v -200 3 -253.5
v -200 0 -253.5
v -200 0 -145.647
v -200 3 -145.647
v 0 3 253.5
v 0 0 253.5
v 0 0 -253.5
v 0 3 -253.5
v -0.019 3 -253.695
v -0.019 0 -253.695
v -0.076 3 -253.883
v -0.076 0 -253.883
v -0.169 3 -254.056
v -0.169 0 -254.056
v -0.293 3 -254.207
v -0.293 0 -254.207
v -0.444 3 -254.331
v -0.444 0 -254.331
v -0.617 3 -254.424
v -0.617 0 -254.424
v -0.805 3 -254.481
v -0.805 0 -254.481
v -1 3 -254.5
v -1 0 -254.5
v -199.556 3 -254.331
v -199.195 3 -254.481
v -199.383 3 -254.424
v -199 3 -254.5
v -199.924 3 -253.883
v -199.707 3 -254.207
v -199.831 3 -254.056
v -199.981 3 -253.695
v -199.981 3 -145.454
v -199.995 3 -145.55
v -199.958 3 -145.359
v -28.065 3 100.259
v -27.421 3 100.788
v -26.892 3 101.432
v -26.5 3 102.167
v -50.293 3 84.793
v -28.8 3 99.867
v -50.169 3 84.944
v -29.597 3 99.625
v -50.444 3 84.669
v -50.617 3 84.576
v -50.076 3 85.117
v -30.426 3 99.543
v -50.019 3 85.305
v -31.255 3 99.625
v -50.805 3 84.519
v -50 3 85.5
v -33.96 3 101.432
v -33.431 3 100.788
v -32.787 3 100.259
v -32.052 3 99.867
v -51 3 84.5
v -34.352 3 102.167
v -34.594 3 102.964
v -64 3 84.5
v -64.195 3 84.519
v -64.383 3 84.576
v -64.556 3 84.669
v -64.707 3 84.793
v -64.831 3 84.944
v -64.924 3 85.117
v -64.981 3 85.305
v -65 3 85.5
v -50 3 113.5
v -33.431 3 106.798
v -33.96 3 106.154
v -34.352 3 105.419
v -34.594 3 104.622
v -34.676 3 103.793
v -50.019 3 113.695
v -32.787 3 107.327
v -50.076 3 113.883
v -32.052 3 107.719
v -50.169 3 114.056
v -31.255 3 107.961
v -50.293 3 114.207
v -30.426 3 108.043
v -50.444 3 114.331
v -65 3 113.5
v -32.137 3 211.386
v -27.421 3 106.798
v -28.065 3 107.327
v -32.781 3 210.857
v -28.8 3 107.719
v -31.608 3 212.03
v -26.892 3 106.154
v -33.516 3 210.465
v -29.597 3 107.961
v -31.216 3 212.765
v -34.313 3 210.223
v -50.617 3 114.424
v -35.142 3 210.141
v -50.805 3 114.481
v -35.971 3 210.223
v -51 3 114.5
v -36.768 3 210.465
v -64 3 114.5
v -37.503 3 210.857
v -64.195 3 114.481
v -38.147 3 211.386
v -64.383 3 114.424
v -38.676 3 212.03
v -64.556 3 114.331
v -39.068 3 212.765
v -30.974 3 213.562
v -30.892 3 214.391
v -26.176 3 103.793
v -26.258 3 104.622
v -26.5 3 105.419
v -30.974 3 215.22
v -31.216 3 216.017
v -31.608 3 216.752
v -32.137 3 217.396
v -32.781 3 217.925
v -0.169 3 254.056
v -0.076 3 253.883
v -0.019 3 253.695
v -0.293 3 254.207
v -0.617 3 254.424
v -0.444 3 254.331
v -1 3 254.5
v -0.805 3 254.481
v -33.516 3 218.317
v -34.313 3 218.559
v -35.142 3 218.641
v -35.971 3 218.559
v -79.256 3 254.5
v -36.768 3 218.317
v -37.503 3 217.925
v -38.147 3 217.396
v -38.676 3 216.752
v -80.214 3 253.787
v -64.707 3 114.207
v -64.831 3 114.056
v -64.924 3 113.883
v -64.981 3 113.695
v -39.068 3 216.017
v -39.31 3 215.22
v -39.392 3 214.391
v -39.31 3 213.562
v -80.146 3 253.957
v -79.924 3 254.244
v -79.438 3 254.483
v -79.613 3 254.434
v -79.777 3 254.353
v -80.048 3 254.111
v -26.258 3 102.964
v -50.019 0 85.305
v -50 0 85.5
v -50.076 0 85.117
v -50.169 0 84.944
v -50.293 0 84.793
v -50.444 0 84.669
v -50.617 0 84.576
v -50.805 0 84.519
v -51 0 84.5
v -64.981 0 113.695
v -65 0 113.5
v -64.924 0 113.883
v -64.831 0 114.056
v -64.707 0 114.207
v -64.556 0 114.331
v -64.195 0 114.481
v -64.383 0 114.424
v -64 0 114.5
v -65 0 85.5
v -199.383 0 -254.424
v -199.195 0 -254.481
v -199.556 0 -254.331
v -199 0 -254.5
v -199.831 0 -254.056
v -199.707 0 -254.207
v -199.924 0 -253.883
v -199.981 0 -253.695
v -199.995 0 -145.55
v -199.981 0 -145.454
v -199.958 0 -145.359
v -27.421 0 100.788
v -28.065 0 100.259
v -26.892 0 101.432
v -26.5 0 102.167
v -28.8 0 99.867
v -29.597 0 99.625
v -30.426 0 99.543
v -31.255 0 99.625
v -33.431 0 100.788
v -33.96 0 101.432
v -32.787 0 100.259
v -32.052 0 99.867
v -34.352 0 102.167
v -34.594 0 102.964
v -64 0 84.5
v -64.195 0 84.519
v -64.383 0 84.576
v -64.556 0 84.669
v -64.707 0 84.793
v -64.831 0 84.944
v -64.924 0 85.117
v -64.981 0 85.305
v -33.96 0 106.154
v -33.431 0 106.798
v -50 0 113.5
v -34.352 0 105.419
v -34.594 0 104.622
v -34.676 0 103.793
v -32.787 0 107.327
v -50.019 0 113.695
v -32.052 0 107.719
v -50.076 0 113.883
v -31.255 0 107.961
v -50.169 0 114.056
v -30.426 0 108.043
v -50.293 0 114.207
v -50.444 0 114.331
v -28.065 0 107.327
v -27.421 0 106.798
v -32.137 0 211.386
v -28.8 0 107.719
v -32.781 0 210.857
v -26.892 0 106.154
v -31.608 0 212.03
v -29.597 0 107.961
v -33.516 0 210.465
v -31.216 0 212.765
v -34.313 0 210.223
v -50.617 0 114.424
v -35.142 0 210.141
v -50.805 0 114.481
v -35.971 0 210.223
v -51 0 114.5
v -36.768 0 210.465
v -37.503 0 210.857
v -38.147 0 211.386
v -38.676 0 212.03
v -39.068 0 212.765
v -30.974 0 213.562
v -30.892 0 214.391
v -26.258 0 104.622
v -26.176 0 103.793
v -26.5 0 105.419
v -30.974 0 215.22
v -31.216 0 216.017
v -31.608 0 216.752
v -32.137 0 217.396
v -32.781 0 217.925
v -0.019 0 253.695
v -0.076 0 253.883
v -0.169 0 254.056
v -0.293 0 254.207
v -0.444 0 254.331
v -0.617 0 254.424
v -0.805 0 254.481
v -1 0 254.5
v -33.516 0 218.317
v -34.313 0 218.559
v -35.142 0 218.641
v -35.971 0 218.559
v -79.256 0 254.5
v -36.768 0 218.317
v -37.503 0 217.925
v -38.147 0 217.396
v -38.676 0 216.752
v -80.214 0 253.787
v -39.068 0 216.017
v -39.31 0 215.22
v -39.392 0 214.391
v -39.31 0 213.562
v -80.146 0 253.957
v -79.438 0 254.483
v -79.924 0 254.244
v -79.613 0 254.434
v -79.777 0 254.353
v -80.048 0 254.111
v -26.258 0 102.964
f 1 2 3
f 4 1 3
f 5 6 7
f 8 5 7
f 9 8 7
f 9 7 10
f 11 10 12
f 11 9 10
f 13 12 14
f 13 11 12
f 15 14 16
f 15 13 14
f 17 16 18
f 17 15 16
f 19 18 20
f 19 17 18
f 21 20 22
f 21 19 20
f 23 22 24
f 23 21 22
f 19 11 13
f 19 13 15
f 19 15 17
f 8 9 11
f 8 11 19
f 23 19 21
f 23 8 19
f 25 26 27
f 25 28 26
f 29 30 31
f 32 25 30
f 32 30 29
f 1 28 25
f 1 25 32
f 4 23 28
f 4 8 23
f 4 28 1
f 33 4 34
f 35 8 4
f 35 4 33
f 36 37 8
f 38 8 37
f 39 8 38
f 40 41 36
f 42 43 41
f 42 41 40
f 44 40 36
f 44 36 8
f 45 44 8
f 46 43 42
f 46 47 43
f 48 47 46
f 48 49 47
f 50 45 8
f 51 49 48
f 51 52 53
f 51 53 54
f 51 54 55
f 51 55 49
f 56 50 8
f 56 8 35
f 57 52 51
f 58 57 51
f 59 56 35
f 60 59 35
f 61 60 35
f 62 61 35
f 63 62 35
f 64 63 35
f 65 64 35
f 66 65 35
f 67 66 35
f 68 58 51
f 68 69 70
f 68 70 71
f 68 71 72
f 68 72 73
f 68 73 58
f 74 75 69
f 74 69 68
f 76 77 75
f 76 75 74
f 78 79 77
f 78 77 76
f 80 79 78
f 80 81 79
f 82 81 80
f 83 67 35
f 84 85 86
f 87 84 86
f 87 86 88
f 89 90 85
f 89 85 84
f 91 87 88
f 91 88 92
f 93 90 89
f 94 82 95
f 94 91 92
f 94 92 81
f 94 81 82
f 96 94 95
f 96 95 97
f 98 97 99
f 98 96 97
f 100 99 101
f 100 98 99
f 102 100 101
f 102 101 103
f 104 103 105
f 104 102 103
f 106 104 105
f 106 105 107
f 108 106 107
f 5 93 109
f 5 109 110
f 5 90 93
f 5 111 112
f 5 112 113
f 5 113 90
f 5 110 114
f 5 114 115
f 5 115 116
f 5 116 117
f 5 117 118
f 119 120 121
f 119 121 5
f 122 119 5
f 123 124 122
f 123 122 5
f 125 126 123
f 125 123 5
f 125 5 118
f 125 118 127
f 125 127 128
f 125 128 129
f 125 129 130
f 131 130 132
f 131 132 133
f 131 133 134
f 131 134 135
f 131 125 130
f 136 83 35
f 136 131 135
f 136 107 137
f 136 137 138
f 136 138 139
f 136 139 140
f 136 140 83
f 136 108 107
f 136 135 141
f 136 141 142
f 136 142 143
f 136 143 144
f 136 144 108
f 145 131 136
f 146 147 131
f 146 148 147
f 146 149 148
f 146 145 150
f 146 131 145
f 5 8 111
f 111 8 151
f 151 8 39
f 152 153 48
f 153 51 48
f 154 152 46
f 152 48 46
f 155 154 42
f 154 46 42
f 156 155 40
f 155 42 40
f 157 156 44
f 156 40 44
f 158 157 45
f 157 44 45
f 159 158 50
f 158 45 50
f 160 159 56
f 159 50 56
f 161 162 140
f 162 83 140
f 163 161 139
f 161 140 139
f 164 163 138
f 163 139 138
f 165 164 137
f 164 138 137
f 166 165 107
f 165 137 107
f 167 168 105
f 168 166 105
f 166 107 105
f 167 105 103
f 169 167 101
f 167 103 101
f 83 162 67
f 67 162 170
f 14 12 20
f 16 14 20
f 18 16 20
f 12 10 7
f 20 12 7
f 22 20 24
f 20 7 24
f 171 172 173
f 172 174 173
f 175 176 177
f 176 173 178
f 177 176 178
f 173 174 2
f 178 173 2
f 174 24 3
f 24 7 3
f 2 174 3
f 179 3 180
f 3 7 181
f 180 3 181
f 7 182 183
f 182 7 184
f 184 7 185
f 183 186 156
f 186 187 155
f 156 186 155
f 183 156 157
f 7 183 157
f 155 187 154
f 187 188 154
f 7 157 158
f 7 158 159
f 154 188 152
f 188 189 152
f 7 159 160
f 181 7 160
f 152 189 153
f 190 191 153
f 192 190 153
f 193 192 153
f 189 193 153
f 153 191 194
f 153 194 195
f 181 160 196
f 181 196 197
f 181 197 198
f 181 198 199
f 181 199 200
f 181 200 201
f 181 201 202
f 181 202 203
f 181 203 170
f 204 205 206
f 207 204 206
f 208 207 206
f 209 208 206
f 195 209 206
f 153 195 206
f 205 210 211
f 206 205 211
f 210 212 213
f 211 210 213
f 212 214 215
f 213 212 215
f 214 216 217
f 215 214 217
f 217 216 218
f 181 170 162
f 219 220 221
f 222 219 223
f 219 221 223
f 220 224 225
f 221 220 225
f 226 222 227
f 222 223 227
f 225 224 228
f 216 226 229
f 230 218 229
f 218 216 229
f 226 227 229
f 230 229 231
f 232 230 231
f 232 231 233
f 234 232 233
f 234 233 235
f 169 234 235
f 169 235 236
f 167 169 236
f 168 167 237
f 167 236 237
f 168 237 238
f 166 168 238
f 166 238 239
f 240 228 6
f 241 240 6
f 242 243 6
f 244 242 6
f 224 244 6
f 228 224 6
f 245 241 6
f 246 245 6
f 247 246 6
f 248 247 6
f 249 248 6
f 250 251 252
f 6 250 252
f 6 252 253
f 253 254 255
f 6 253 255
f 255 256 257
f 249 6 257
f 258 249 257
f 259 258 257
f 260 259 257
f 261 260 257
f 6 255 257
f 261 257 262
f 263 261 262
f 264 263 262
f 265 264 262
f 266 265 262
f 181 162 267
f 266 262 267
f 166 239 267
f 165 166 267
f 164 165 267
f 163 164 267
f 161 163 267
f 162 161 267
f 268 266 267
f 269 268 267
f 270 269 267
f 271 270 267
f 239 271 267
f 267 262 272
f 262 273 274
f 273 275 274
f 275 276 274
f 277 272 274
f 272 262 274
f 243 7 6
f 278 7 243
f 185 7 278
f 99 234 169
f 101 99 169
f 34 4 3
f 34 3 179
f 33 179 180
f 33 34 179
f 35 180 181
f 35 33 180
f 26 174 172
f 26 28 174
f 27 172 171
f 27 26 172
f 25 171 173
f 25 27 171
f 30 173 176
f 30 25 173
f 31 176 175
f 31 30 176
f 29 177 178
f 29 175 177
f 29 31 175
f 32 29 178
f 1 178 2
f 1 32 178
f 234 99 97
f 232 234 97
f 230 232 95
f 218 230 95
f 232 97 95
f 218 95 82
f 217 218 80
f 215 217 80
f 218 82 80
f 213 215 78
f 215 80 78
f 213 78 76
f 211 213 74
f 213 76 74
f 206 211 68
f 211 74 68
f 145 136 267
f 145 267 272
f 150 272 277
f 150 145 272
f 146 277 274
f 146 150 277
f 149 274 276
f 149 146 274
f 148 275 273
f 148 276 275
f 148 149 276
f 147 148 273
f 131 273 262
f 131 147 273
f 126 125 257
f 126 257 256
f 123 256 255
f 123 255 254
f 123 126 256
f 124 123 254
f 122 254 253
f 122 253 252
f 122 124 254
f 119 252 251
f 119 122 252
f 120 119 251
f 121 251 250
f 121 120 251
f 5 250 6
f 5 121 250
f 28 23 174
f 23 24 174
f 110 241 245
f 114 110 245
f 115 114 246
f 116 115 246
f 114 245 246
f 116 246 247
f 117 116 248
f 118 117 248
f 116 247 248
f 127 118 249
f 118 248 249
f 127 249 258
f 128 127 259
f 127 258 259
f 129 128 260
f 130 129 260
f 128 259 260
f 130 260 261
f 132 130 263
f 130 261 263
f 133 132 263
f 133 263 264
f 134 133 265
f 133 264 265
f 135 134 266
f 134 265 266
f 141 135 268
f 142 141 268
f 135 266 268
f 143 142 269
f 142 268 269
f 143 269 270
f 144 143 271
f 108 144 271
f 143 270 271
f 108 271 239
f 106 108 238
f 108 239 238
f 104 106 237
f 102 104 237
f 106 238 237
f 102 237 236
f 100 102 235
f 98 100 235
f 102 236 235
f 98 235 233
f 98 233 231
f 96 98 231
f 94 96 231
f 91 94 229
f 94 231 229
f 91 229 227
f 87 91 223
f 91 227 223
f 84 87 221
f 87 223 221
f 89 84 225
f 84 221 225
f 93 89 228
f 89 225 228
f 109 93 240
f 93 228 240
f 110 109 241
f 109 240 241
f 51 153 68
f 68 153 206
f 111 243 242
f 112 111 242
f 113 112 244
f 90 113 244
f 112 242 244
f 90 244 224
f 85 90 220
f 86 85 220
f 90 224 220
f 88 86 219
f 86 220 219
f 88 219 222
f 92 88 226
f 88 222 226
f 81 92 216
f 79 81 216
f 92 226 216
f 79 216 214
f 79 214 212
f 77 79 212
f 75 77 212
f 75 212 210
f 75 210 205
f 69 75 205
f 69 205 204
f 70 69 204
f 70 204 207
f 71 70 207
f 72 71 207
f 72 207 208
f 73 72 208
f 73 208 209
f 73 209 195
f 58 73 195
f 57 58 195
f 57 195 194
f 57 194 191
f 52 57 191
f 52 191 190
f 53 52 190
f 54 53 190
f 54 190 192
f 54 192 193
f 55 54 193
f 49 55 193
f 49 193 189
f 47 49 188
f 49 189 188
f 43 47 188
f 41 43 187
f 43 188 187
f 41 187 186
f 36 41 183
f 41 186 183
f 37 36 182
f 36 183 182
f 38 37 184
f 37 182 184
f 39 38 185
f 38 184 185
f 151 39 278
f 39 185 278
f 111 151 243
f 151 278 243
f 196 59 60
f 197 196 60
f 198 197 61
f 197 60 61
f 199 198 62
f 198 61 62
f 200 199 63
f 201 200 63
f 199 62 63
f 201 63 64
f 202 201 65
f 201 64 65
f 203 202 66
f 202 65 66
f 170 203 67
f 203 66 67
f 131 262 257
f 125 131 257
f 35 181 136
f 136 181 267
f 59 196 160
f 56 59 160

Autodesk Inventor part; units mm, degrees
ref_plane "YZ Plane" through (0, 0, 0) normal (1, 0, 0) x (0, 1, 0)
ref_plane "XZ Plane" through (0, 0, 0) normal (0, 1, 0) x (-1, 0, 0)
ref_plane "XY Plane" through (0, 0, 0) normal (0, 0, 1) x (1, 0, 0)
sketch "スケッチ1" plane through (0, 0, 0) normal (0, 1, 0) x (-1, 0, 0)
  line L0 (0, 254.5) -> (0, -254.5)
  line L1 (0, -254.5) -> (200, -254.5)
  line L2 (200, -254.5) -> (200, -145.5)
  line L3 (200, -145.5) -> (80, 254.5)
  line L4 (80, 254.5) -> (0, 254.5)
  point P0 (0, 0)
  point P1 (0, 0)
  dimension "d0" = 509
  dimension "d1" = 200
  dimension "d2" = 109
  dimension "d3" = 80
extrude "押し出し1" add sketch "スケッチ1" along normal blind 3
sketch "スケッチ2" plane through (0, 0, 0) normal (0, -1, 0) x (1, 0, 0)
  circle A0 centre (-35.142, 214.391) radius 4.25
  circle A1 centre (-30.426, 103.793) radius 4.25
  line L0 (-65, 84.5) -> (-50, 84.5)
  line L1 (-50, 84.5) -> (-50, 114.5)
  line L2 (-50, 114.5) -> (-65, 114.5)
  line L3 (-65, 114.5) -> (-65, 84.5)
  line L4 (-80, 254.5) -> (0, 254.5) projected
  line L5 (0, 254.5) -> (0, -254.5) projected
  point P0 (0, 0)
  dimension "d6" = 15
  dimension "d7" = 30
  dimension "d8" = 8.5
  dimension "d9" = 8.5
  dimension "d10" = 40.109
  dimension "d11" = 35.142
  dimension "d12" = 150.707
  dimension "d13" = 30.426
  dimension "d14" = 140
  dimension "d15" = 50
extrude "押し出し2" cut sketch "スケッチ2" against normal blind 3
fillet "フィレット1" radius 1 9 edges at (-80, 1.5, 254.5) (0, 1.5, 254.5) (-200, 1.5, -145.5) (-200, 1.5, -254.5) (0, 1.5, -254.5) (-50, 1.5, 84.5) (-50, 1.5, 114.5) (-65, 1.5, 114.5) (-65, 1.5, 84.5)
